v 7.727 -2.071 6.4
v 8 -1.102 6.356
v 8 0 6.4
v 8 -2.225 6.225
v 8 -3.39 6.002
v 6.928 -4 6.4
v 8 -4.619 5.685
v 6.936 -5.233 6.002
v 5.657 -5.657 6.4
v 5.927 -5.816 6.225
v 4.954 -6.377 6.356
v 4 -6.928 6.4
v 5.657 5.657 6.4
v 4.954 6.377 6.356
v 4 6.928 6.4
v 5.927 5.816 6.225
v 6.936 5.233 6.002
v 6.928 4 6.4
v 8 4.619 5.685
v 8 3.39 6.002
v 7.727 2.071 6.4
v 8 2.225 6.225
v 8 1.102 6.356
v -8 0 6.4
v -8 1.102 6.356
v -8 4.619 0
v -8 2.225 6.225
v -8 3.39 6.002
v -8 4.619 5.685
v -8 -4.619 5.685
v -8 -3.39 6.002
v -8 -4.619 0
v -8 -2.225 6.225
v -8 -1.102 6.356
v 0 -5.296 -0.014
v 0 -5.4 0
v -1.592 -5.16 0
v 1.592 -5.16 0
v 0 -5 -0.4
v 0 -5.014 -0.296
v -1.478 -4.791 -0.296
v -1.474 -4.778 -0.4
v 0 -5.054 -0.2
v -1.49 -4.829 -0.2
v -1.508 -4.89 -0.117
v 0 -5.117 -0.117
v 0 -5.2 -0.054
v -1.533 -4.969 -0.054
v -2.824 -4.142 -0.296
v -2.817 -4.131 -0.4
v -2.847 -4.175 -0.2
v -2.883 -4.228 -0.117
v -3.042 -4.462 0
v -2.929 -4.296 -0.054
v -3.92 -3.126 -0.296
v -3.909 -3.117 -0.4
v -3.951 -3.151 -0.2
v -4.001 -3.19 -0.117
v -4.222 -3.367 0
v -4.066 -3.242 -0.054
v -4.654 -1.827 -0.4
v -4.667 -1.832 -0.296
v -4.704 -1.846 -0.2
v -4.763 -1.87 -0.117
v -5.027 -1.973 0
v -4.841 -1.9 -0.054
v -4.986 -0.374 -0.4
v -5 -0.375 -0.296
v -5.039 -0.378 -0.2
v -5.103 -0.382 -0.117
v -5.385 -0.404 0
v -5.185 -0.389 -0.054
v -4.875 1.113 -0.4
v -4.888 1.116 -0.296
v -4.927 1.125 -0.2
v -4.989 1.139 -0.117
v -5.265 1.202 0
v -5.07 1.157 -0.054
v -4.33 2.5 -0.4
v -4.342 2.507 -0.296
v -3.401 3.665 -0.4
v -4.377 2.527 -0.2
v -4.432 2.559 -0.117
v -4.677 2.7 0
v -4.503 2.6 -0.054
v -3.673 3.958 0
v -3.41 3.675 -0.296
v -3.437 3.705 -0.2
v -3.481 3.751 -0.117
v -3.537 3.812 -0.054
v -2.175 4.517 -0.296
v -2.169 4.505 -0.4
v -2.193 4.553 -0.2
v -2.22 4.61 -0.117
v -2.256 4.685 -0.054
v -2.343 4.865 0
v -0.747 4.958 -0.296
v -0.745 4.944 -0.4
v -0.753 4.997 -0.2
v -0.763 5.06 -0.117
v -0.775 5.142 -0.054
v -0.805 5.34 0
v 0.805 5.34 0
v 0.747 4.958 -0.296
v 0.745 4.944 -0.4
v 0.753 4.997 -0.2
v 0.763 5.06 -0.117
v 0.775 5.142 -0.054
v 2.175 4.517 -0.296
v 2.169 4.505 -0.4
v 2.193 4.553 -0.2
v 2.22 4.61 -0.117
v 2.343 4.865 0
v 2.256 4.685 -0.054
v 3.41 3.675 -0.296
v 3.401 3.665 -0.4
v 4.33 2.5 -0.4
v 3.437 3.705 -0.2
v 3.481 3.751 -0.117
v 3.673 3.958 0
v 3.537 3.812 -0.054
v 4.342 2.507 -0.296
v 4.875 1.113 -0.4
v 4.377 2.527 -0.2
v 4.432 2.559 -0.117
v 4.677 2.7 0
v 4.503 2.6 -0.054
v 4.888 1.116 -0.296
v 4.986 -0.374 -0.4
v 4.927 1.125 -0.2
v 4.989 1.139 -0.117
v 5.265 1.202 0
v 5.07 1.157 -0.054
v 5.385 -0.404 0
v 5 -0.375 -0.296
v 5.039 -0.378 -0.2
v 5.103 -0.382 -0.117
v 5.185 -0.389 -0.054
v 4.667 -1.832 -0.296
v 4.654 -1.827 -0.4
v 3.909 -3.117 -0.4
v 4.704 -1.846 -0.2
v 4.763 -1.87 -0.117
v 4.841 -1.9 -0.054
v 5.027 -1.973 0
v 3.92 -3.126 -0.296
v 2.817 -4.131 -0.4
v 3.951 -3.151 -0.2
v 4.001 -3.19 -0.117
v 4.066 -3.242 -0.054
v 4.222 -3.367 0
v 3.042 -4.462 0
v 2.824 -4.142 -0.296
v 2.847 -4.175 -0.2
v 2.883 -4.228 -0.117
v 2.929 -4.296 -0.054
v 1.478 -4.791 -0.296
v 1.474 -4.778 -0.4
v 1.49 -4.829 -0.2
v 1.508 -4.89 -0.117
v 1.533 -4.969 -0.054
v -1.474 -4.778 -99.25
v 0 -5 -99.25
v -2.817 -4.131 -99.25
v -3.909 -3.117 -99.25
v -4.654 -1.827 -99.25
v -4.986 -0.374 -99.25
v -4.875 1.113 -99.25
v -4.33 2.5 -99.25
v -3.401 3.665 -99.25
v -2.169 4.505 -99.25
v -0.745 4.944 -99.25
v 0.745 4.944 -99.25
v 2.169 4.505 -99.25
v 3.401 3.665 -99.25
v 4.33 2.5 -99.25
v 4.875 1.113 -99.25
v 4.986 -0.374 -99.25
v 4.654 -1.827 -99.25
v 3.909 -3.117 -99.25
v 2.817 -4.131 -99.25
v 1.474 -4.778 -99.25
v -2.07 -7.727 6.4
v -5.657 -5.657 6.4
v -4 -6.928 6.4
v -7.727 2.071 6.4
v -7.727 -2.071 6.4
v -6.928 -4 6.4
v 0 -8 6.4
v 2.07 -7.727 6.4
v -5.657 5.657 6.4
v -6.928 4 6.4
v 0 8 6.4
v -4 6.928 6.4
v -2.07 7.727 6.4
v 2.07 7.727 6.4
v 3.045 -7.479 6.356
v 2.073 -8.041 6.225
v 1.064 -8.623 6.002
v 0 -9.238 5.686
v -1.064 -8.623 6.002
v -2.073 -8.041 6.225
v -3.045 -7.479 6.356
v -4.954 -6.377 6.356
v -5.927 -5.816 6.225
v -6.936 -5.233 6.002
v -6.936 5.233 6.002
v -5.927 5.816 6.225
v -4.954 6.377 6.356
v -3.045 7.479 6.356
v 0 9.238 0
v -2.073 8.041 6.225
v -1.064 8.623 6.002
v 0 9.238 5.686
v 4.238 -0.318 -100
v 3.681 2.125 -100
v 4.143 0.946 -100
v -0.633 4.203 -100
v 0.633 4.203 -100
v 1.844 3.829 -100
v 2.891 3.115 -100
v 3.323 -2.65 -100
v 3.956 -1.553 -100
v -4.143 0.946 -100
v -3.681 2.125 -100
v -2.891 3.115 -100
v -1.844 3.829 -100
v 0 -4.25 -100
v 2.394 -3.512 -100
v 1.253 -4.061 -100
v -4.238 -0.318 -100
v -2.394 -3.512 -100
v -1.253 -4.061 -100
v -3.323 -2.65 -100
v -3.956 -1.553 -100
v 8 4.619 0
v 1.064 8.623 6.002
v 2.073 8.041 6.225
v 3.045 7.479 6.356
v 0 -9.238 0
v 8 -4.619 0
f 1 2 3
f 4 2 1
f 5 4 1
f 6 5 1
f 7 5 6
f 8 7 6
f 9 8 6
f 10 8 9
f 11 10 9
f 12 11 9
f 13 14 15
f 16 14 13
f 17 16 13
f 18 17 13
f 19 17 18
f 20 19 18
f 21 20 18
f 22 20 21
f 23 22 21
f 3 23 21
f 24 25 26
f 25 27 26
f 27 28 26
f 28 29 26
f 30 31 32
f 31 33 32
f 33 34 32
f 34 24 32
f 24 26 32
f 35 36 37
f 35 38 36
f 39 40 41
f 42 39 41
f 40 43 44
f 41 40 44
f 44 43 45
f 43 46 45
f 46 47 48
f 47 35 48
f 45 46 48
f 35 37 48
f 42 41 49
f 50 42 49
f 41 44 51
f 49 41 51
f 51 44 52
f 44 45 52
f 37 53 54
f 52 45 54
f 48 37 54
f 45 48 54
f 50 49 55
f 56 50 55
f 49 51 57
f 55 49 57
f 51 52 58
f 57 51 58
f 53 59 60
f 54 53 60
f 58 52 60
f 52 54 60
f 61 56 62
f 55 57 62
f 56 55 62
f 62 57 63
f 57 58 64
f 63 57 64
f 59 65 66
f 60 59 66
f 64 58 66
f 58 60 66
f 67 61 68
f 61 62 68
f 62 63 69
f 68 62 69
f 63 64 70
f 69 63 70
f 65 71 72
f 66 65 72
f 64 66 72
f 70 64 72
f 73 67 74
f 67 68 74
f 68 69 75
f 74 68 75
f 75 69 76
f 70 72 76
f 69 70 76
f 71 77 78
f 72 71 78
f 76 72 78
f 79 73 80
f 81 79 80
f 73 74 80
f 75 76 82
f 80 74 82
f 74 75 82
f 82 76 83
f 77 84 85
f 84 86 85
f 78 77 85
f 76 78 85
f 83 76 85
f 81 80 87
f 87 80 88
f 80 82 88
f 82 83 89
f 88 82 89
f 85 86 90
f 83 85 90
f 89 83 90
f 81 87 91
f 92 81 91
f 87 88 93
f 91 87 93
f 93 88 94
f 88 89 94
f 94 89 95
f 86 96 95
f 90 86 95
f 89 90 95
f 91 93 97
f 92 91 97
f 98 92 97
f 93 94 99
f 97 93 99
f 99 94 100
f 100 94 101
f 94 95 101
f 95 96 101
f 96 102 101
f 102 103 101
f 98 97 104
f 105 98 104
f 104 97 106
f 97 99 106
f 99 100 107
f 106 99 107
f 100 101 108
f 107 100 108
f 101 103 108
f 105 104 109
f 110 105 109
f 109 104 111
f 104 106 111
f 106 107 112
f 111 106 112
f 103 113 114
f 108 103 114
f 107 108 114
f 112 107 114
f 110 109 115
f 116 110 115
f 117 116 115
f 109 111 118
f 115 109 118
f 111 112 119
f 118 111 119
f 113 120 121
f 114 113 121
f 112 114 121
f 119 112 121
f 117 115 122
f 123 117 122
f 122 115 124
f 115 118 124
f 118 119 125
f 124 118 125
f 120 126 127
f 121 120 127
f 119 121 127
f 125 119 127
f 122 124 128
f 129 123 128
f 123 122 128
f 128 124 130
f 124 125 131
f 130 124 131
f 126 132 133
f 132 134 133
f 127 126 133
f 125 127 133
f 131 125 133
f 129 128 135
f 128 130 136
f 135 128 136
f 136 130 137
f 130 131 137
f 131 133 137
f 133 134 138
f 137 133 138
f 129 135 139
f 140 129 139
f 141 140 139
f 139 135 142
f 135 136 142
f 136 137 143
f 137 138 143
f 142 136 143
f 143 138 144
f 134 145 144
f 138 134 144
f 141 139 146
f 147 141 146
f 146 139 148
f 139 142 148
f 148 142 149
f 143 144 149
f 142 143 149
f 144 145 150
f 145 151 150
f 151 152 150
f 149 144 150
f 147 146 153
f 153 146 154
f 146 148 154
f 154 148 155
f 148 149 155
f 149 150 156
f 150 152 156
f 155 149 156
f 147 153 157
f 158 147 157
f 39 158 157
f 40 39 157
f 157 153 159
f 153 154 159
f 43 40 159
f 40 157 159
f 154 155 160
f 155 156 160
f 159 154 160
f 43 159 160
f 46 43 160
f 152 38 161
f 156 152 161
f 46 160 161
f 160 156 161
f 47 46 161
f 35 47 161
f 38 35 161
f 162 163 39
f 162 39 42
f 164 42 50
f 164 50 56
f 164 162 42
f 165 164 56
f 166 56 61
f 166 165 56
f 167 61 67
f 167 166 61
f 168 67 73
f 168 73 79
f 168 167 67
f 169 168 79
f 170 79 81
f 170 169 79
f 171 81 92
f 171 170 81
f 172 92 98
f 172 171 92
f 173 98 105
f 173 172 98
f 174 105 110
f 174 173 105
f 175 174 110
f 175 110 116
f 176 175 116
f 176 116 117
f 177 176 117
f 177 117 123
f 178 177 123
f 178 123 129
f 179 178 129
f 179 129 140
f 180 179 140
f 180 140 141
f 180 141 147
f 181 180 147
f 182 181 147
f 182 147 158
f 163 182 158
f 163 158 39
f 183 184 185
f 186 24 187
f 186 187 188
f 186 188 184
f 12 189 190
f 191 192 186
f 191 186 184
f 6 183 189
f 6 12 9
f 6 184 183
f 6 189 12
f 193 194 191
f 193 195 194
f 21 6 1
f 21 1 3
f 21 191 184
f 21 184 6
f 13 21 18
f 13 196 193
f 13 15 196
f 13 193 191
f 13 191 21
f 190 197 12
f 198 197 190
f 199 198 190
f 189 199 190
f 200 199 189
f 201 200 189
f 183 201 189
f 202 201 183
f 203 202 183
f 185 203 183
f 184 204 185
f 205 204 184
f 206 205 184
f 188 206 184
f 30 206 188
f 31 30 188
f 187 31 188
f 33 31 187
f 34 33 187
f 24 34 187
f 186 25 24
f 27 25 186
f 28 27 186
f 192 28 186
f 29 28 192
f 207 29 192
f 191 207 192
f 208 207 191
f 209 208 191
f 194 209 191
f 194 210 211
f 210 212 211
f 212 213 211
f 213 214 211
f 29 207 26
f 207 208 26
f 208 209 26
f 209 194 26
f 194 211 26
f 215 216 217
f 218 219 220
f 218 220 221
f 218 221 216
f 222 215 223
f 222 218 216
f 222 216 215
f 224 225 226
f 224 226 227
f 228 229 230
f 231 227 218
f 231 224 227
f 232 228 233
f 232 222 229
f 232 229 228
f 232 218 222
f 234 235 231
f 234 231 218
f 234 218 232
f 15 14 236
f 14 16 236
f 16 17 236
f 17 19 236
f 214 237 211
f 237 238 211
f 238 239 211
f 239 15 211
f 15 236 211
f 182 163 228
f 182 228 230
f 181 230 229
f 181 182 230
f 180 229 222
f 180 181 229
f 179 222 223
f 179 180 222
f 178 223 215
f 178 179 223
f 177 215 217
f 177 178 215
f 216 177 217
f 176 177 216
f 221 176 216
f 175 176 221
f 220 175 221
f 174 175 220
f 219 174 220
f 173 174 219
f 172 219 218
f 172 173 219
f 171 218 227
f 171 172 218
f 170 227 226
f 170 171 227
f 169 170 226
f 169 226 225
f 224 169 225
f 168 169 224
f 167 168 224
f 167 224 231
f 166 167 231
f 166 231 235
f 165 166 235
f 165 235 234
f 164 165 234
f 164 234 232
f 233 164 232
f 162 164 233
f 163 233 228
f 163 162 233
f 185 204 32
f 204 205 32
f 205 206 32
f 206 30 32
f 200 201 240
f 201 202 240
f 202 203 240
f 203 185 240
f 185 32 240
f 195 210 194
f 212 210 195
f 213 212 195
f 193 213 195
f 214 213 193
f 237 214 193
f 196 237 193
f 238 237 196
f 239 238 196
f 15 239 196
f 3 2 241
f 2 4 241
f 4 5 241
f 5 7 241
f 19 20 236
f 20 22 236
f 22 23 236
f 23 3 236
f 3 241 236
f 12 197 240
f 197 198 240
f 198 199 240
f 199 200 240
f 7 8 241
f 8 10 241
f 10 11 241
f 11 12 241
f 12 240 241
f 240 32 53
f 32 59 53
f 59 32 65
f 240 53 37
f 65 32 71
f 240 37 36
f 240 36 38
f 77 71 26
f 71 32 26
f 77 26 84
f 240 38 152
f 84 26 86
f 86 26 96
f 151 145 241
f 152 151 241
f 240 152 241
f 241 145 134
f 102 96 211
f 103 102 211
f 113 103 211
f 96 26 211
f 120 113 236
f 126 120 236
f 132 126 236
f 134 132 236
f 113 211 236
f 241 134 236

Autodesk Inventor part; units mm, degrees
ref_plane "WorkPlane1" through (0, 0, 0) normal (0, 0, 1) x (1, 0, 0)
sketch "Sketch1" plane through (0, 0, 0) normal (0, 0, 1) x (1, 0, 0)
  point P0 (0, 0)
sketch "Sketch2" plane through (0, 0, 0) normal (0, 0, 1) x (1, 0, 0)
  line L0 (-8, 4.6189) -> (-8, -4.6189)
  line L1 (0, 9.2375) -> (-8, 4.6189)
  line L2 (8, 4.6189) -> (0, 9.2375)
  line L3 (8, -4.6189) -> (8, 4.6189)
  line L4 (0, -9.2375) -> (8, -4.6189)
  line L5 (-8, -4.6189) -> (0, -9.2375)
  circle A0 centre (0, 0) radius 8 construction
  dimension "d1" = 16
  dimension "d29" = 0
  dimension "d30" = 0
extrude "Extrusion1" add sketch "Sketch2" along normal blind 6.4
sketch "Sketch3" plane through (0, 0, 0) normal (1, 0, 0) x (0, 1, 0)
  line L0 (8, 6.4) -> (9.3375, 6.4)
  line L1 (9.3375, 5.6278) -> (8, 6.4)
  line L2 (9.3375, 6.4) -> (9.3375, 5.6278)
  line L3 (0, -1.28) -> (0, 7.68) projected
  line L4 (9.2375, 0) -> (9.2375, 6.4) projected
  dimension "d25" = 0.1
  dimension "d26" = 0
  dimension "d27" = 60
  dimension "d28" = 8
revolve "Revolution1" cut sketch "Sketch3" angle 360 about axis through (0, 0, -10) along (0, 0, 1)
sketch "Sketch4" plane through (0, 0, 0) normal (1, 0, 0) x (0, 1, 0)
  line L0 (0, -100) -> (0, 0)
  line L1 (-5, -100) -> (0, -100)
  line L2 (-5, 0) -> (-5, -100)
  line L3 (0, 0) -> (-5, 0)
  line L4 (0, -100) -> (0, 0)
  line L5 (-6, 0) -> (1, 0) projected
  line L6 (0, -120) -> (0, 20) projected
  dimension "d18" = 5
  dimension "d20" = 100
  dimension "d33" = 0
  dimension "d34" = 0
revolve "Revolution2" add sketch "Sketch4" angle 360 about axis through (0, 0, -100) along (0, 0, -1)
chamfer "Chamfer1" distance 0.75 angle 45 1 edges at (0, 5, -100)
fillet "Fillet1" radius 0.4 1 edges at (0, 5, 0)
thread "Thread1" size "M10x1.5" class "6g" standard "ISO Metric profile" length 97
ref_plane "MSC_PF1" through (0, 0, 0) normal (1, 0, 0) x (0, 1, 0)
ref_plane "MSC_PT1" through (0, 0, 0) normal (0, 0, -1) x (-1, 0, 0)
equation "\"d22\" = 0.5 * PTC"
equation "\"d23\" = 0.5 * PTC"
equation "\"d24\" = r"
equation "\"d1\" = ParS"
equation "\"d6\" = ParK"
equation "\"b\" = NLG - 2 * PTC"
equation "\"d28\" = 0.5 * ParS"
equation "\"d18\" = 0.5 * NND"
equation "\"d20\" = NLG"
equation "\"NLG\" = 100"
equation "\"PTC\" = 1.5"
equation "\"ParK\" = 6.4"
equation "\"ParS\" = 16"
equation "\"msp_es\" = 0.577367 * ParS"
equation "\"r\" = 0.4"
equation "\"K1\" = 4.17"
equation "\"NND\" = 10"
properties part number "DIN EN ISO 4018 - M10x100" material "Stainless Steel"
